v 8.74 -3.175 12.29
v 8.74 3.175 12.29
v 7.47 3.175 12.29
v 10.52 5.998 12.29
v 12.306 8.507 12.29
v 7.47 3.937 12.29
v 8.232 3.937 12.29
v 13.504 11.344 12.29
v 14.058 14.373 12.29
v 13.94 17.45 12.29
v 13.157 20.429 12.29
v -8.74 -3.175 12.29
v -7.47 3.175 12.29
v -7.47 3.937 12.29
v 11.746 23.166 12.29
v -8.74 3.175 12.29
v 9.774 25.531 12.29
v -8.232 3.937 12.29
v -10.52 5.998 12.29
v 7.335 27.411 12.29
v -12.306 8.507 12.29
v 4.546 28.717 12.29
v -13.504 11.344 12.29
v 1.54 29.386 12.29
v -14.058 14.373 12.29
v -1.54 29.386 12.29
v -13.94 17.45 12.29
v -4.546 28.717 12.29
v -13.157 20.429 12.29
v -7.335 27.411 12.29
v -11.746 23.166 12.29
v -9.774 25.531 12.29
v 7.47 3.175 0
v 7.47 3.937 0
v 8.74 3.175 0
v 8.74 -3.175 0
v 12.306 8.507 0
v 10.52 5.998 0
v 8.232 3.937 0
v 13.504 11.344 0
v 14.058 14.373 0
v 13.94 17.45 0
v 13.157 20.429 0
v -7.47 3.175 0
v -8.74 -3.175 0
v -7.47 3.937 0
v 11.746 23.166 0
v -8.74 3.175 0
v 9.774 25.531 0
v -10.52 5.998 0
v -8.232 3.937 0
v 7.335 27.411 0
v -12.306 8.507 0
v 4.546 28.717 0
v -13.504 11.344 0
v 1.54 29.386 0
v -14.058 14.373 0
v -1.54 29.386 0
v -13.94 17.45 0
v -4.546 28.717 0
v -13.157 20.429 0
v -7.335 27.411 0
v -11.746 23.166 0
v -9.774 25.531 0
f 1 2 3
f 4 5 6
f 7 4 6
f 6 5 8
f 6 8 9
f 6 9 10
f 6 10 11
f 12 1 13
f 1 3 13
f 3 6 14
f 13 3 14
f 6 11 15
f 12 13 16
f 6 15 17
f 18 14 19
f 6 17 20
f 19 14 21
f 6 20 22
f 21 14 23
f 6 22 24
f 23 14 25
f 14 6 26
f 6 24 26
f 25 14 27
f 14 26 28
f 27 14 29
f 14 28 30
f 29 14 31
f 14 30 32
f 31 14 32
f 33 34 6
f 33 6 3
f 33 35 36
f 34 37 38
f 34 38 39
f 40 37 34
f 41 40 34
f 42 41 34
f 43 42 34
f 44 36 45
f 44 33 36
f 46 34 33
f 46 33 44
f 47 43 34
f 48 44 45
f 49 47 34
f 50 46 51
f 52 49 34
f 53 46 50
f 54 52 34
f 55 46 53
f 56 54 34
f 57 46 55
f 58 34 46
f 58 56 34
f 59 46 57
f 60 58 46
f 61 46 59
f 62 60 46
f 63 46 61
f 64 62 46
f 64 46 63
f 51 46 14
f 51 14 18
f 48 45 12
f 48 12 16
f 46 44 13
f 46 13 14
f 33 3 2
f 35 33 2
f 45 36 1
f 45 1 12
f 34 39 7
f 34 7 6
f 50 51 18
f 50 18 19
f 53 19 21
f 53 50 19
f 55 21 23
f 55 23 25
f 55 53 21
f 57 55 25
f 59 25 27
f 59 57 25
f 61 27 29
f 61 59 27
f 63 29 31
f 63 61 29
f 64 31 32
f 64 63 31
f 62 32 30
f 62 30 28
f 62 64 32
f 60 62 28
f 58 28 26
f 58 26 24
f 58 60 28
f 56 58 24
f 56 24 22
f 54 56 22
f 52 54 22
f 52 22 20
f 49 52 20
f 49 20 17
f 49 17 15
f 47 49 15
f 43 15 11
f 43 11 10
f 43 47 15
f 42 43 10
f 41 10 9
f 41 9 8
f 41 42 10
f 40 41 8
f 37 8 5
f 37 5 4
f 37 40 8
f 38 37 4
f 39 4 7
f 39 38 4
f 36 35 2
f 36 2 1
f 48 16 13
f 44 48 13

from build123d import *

# Parameters (mm, degrees)
BOSS_EXTRUDE1_DEPTH = 12.29


with BuildPart() as part:
    # Sketch2 → Boss-Extrude1 (new body)
    with BuildSketch(Plane.XY):
        with BuildLine():
            Line((-8.74, 3.175), (-7.47, 3.175))
            Line((-7.47, 3.175), (-7.47, 3.937))
            Line((-7.47, 3.937), (-8.232, 3.937))
            ThreePointArc((-8.232, 3.937), (0, 29.470311879), (8.232, 3.937))
            Line((8.232, 3.937), (7.47, 3.937))
            Line((7.47, 3.937), (7.47, 3.175))
            Line((7.47, 3.175), (8.74, 3.175))
            Line((8.74, 3.175), (8.74, -3.175))
            Line((8.74, -3.175), (-8.74, -3.175))
            Line((-8.74, -3.175), (-8.74, 3.175))
        make_face()
    extrude(amount=BOSS_EXTRUDE1_DEPTH)


solid = part.part
